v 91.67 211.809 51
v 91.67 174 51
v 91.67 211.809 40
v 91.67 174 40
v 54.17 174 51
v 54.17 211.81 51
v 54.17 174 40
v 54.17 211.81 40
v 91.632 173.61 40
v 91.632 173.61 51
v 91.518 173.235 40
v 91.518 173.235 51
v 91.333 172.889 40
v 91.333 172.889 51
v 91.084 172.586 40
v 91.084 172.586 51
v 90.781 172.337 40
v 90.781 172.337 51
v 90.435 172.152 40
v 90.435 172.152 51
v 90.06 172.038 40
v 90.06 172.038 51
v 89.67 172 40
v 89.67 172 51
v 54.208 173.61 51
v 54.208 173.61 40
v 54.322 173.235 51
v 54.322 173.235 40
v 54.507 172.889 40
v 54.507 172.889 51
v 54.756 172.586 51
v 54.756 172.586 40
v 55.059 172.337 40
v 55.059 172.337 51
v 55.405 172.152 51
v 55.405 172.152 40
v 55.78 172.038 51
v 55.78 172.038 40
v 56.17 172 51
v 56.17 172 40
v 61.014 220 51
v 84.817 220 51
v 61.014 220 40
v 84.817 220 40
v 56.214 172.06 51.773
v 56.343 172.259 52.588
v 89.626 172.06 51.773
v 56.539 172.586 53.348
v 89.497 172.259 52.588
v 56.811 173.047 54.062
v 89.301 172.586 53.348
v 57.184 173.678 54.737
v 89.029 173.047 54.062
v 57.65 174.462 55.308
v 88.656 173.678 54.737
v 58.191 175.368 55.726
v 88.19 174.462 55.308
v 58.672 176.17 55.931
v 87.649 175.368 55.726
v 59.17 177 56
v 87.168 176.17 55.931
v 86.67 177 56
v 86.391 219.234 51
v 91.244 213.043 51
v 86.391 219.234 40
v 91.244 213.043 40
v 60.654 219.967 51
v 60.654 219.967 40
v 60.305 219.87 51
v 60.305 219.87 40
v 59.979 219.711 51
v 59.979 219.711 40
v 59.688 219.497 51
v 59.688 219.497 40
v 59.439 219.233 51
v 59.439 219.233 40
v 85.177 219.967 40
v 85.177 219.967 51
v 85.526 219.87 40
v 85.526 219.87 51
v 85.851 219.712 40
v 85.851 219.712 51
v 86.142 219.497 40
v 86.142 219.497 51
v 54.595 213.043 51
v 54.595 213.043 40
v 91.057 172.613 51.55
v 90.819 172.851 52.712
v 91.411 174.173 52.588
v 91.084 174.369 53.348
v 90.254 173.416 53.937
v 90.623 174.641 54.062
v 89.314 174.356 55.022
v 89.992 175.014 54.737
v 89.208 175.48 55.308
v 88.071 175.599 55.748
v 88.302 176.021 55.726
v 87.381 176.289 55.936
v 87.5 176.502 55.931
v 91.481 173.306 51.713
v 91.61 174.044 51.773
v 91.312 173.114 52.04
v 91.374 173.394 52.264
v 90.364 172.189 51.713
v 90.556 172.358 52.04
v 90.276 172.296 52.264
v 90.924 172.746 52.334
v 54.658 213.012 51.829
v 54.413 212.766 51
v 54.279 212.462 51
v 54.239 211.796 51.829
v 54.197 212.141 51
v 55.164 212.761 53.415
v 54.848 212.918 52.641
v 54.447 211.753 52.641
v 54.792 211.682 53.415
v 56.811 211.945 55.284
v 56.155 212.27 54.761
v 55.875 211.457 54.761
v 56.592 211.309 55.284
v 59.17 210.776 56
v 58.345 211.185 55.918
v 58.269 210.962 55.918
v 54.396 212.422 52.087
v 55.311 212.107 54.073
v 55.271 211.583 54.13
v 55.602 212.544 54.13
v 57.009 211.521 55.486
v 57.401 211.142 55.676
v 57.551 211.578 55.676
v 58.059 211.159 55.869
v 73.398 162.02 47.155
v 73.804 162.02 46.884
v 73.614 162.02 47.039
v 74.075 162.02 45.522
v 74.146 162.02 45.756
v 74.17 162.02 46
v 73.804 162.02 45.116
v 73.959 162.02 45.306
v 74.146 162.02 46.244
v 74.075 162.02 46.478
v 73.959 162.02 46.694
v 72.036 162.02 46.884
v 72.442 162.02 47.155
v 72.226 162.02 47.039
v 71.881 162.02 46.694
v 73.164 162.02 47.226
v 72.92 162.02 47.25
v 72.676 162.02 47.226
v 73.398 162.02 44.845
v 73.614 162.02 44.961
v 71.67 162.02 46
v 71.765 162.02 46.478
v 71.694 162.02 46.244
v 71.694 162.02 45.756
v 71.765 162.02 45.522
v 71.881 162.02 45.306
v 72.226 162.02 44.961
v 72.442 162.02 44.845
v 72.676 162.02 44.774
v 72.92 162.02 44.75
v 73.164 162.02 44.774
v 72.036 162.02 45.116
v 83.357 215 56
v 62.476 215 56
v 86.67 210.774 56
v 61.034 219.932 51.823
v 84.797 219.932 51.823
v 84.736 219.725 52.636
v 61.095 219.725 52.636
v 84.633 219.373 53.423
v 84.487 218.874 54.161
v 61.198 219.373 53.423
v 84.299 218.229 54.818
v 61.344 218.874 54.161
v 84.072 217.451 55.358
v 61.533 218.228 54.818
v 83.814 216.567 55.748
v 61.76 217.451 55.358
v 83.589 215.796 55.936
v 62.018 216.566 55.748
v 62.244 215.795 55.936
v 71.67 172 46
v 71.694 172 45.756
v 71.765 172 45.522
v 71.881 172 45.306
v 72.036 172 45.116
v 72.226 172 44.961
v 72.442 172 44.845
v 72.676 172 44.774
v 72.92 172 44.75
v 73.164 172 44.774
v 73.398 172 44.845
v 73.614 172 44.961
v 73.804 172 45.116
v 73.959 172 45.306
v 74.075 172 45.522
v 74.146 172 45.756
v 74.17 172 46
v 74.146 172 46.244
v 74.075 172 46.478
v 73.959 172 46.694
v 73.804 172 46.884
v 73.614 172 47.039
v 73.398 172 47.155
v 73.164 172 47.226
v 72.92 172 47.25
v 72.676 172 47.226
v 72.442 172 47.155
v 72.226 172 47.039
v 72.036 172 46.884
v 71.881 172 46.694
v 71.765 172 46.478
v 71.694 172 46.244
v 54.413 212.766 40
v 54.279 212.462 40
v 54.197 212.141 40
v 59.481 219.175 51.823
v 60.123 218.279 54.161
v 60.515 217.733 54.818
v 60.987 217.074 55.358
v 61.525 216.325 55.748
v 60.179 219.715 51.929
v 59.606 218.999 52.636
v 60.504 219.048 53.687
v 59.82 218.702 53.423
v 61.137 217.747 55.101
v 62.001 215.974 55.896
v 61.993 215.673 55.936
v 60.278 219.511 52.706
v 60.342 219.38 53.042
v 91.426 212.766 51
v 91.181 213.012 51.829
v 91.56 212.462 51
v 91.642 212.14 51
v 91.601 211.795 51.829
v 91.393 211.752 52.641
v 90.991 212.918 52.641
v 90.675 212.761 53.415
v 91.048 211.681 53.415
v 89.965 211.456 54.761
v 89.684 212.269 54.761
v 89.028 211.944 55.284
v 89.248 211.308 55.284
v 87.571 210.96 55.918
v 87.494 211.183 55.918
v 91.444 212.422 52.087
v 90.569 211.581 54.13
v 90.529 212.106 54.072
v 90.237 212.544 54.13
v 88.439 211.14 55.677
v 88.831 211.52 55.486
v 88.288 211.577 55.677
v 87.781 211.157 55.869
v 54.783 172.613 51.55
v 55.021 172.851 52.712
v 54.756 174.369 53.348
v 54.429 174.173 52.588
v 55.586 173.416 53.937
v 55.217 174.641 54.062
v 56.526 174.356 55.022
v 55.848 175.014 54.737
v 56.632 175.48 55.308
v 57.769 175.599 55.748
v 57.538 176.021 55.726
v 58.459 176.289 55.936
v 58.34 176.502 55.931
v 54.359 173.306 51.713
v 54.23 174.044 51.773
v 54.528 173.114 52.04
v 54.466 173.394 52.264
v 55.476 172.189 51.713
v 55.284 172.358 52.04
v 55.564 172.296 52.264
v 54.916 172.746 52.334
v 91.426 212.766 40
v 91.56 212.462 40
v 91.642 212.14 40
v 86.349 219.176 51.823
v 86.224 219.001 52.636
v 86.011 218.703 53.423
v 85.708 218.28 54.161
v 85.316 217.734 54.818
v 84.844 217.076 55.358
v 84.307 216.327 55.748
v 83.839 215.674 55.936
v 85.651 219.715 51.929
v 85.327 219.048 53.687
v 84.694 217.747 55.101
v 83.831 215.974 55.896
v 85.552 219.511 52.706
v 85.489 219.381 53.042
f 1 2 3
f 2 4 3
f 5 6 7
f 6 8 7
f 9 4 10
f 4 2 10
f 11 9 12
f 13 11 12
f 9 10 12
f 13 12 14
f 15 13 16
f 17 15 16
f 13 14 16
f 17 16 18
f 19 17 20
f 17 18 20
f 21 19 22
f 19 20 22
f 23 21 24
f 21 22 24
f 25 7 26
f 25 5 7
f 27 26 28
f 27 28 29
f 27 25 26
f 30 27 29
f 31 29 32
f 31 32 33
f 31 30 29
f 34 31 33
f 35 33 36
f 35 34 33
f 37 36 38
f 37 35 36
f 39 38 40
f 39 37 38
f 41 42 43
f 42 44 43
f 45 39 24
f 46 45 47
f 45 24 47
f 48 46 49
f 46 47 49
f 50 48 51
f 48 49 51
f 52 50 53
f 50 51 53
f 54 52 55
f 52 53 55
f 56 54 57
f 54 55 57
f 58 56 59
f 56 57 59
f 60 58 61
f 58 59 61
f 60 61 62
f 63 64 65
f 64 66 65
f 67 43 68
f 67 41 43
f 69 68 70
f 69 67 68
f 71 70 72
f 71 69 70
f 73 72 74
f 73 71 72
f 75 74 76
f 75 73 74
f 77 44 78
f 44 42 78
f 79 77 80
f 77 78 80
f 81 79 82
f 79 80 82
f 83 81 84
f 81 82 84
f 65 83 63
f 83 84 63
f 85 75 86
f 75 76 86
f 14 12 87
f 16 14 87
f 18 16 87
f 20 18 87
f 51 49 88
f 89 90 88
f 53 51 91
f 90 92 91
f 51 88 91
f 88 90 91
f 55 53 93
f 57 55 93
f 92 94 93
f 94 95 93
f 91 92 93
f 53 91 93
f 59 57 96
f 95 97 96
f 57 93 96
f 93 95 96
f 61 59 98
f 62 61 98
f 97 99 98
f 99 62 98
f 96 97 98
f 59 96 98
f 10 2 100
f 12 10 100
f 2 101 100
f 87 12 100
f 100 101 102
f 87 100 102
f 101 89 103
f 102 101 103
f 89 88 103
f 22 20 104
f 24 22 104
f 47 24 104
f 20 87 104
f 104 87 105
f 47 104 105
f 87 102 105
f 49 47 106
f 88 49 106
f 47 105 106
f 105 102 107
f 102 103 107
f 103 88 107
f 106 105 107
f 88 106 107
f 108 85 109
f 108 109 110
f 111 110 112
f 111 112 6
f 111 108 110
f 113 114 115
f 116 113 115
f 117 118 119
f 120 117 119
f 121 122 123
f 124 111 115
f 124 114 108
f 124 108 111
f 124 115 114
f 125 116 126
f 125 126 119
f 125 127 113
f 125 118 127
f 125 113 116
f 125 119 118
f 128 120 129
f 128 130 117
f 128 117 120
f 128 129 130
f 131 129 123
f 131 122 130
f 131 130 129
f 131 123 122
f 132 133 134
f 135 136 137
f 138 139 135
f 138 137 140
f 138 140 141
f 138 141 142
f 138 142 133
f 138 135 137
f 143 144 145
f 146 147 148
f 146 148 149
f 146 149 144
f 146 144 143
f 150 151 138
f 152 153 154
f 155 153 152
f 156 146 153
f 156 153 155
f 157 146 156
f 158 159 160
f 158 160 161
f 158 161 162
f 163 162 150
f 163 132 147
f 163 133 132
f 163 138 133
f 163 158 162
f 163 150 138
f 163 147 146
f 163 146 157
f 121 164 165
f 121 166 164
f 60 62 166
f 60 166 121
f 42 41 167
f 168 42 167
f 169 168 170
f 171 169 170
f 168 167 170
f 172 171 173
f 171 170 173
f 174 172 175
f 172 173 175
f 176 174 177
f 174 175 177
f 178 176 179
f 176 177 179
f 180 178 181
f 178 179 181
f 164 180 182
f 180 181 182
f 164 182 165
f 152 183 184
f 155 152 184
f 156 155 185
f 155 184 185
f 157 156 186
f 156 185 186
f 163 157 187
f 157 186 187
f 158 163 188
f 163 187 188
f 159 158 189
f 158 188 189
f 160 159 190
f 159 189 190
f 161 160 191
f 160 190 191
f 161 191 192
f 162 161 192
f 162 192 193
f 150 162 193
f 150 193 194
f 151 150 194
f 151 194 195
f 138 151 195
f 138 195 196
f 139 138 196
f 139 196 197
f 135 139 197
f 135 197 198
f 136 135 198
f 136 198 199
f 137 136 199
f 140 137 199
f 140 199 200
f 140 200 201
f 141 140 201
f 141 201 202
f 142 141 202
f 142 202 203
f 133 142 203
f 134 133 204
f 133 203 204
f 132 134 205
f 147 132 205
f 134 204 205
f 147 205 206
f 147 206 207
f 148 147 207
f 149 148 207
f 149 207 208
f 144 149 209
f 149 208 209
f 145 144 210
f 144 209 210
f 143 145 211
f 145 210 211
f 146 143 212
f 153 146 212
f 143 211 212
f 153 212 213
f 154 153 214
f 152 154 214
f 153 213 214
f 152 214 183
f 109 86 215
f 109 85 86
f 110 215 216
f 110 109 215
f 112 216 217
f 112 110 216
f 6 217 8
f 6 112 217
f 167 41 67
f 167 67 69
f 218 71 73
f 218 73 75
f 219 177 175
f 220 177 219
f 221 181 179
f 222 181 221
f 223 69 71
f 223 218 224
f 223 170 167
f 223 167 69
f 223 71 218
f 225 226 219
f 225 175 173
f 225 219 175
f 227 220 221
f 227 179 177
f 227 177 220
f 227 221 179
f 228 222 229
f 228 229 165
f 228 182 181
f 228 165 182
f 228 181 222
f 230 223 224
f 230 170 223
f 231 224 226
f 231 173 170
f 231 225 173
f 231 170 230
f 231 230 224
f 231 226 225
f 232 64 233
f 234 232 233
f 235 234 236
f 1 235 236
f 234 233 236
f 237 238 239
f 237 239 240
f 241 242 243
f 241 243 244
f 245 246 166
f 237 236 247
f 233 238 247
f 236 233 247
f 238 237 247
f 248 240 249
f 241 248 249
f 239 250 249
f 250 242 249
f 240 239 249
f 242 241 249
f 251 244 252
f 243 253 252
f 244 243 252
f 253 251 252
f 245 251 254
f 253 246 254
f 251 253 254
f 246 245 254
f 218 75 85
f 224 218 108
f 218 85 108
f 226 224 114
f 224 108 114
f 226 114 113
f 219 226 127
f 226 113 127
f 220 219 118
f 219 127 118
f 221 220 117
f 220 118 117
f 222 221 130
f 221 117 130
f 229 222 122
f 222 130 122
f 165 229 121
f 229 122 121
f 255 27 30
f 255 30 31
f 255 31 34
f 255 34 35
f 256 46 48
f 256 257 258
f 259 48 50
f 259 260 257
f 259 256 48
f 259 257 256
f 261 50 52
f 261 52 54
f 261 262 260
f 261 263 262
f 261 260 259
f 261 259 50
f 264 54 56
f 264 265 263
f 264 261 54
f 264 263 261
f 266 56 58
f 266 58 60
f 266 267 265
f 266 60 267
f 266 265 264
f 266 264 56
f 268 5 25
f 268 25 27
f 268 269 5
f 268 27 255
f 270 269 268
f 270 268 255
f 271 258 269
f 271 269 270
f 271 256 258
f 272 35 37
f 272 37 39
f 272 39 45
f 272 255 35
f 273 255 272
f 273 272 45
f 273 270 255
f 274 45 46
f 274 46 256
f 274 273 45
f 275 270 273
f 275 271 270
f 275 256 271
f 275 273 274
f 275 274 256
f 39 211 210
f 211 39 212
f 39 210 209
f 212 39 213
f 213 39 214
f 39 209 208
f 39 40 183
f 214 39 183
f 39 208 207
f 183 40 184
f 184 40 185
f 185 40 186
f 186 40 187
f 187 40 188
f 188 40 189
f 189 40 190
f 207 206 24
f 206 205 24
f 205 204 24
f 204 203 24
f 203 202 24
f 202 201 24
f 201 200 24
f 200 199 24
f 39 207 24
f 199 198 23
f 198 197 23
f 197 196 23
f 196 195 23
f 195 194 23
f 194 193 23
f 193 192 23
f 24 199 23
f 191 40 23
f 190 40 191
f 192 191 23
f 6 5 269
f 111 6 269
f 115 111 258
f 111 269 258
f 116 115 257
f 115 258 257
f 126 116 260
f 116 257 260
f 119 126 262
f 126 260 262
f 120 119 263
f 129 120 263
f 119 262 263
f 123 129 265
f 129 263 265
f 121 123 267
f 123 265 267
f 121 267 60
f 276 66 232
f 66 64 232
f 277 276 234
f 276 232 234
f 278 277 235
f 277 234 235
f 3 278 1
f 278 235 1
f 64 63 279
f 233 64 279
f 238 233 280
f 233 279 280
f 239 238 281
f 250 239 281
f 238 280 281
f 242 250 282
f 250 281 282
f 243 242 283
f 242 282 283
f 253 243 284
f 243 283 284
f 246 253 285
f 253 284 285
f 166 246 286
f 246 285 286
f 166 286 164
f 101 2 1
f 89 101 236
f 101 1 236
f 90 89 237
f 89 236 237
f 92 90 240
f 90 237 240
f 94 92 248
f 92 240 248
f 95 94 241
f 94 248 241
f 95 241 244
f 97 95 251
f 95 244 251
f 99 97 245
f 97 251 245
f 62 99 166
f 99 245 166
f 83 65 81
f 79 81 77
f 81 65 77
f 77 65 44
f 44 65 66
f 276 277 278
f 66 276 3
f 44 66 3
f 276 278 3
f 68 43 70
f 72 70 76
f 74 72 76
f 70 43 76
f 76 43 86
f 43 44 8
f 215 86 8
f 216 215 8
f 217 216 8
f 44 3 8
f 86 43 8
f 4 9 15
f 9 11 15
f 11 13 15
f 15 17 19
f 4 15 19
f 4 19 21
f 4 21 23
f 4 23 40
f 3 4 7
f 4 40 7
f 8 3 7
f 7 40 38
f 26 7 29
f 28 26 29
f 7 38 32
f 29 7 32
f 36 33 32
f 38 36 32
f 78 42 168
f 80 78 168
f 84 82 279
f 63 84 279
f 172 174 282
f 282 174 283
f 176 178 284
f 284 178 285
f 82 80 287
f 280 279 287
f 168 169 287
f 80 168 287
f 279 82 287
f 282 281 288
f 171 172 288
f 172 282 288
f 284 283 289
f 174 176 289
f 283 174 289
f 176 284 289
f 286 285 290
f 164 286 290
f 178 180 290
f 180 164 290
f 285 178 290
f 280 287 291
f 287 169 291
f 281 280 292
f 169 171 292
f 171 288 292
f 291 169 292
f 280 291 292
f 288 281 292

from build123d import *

# Parameters (mm, degrees)
CYLINDER019_R             = 1.25
CYLINDER019_DEPTH         = 10
EXTRUDE002_DEPTH          = 16
FILLET_R                  = 5
FILLET001_R               = 2
FUSION001_PLACEMENT_ANGLE = 180


with BuildPart() as cylinder019:
    # Cylinder019 → Cylinder019 (new body)
    with BuildSketch(Plane(origin=(18.75, 47.98, 6), x_dir=(1, 0, 0), z_dir=(0, 1, 0))):
        Circle(CYLINDER019_R)
    extrude(amount=CYLINDER019_DEPTH)


with BuildPart() as gps002:
    # Sketch016 → Extrude002 (new body)
    with BuildSketch(Plane.XY):
        Polygon((5.88, 0), (31.63, 0), (37.5, 7.5), (37.5, 48), (0, 48), (0, 7.5), align=None)
    extrude(amount=EXTRUDE002_DEPTH)

    # Fillet
    fillet_edges = [gps002.edges().sort_by_distance(p)[0] for p in [
        (18.755, 0, 16),
        (34.565, 3.75, 16),
        (37.5, 27.75, 16),
        (18.75, 48, 16),
        (0, 27.75, 16),
        (2.94, 3.75, 16),
    ]]
    fillet(fillet_edges, radius=FILLET_R)

    # Fillet001
    fillet001_edges = [gps002.edges().sort_by_distance(p)[0] for p in [
        (5.88, 0, 5.5),
        (31.63, 0, 5.5),
        (0, 7.5, 5.5),
        (37.5, 7.5, 5.5),
        (0, 48, 5.5),
        (37.5, 48, 5.5),
    ]]
    fillet(fillet001_edges, radius=FILLET001_R)

    # Fusion001: union Cylinder019
    add(cylinder019.part)


with BuildPart() as gps002_1:
    # Fusion001 placement: moved
    add(gps002.part.moved(Location((91.67, 220, 40))).rotate(Axis((91.67, 220, 40), (0, 0, 1)), FUSION001_PLACEMENT_ANGLE))


solid = gps002_1.part
